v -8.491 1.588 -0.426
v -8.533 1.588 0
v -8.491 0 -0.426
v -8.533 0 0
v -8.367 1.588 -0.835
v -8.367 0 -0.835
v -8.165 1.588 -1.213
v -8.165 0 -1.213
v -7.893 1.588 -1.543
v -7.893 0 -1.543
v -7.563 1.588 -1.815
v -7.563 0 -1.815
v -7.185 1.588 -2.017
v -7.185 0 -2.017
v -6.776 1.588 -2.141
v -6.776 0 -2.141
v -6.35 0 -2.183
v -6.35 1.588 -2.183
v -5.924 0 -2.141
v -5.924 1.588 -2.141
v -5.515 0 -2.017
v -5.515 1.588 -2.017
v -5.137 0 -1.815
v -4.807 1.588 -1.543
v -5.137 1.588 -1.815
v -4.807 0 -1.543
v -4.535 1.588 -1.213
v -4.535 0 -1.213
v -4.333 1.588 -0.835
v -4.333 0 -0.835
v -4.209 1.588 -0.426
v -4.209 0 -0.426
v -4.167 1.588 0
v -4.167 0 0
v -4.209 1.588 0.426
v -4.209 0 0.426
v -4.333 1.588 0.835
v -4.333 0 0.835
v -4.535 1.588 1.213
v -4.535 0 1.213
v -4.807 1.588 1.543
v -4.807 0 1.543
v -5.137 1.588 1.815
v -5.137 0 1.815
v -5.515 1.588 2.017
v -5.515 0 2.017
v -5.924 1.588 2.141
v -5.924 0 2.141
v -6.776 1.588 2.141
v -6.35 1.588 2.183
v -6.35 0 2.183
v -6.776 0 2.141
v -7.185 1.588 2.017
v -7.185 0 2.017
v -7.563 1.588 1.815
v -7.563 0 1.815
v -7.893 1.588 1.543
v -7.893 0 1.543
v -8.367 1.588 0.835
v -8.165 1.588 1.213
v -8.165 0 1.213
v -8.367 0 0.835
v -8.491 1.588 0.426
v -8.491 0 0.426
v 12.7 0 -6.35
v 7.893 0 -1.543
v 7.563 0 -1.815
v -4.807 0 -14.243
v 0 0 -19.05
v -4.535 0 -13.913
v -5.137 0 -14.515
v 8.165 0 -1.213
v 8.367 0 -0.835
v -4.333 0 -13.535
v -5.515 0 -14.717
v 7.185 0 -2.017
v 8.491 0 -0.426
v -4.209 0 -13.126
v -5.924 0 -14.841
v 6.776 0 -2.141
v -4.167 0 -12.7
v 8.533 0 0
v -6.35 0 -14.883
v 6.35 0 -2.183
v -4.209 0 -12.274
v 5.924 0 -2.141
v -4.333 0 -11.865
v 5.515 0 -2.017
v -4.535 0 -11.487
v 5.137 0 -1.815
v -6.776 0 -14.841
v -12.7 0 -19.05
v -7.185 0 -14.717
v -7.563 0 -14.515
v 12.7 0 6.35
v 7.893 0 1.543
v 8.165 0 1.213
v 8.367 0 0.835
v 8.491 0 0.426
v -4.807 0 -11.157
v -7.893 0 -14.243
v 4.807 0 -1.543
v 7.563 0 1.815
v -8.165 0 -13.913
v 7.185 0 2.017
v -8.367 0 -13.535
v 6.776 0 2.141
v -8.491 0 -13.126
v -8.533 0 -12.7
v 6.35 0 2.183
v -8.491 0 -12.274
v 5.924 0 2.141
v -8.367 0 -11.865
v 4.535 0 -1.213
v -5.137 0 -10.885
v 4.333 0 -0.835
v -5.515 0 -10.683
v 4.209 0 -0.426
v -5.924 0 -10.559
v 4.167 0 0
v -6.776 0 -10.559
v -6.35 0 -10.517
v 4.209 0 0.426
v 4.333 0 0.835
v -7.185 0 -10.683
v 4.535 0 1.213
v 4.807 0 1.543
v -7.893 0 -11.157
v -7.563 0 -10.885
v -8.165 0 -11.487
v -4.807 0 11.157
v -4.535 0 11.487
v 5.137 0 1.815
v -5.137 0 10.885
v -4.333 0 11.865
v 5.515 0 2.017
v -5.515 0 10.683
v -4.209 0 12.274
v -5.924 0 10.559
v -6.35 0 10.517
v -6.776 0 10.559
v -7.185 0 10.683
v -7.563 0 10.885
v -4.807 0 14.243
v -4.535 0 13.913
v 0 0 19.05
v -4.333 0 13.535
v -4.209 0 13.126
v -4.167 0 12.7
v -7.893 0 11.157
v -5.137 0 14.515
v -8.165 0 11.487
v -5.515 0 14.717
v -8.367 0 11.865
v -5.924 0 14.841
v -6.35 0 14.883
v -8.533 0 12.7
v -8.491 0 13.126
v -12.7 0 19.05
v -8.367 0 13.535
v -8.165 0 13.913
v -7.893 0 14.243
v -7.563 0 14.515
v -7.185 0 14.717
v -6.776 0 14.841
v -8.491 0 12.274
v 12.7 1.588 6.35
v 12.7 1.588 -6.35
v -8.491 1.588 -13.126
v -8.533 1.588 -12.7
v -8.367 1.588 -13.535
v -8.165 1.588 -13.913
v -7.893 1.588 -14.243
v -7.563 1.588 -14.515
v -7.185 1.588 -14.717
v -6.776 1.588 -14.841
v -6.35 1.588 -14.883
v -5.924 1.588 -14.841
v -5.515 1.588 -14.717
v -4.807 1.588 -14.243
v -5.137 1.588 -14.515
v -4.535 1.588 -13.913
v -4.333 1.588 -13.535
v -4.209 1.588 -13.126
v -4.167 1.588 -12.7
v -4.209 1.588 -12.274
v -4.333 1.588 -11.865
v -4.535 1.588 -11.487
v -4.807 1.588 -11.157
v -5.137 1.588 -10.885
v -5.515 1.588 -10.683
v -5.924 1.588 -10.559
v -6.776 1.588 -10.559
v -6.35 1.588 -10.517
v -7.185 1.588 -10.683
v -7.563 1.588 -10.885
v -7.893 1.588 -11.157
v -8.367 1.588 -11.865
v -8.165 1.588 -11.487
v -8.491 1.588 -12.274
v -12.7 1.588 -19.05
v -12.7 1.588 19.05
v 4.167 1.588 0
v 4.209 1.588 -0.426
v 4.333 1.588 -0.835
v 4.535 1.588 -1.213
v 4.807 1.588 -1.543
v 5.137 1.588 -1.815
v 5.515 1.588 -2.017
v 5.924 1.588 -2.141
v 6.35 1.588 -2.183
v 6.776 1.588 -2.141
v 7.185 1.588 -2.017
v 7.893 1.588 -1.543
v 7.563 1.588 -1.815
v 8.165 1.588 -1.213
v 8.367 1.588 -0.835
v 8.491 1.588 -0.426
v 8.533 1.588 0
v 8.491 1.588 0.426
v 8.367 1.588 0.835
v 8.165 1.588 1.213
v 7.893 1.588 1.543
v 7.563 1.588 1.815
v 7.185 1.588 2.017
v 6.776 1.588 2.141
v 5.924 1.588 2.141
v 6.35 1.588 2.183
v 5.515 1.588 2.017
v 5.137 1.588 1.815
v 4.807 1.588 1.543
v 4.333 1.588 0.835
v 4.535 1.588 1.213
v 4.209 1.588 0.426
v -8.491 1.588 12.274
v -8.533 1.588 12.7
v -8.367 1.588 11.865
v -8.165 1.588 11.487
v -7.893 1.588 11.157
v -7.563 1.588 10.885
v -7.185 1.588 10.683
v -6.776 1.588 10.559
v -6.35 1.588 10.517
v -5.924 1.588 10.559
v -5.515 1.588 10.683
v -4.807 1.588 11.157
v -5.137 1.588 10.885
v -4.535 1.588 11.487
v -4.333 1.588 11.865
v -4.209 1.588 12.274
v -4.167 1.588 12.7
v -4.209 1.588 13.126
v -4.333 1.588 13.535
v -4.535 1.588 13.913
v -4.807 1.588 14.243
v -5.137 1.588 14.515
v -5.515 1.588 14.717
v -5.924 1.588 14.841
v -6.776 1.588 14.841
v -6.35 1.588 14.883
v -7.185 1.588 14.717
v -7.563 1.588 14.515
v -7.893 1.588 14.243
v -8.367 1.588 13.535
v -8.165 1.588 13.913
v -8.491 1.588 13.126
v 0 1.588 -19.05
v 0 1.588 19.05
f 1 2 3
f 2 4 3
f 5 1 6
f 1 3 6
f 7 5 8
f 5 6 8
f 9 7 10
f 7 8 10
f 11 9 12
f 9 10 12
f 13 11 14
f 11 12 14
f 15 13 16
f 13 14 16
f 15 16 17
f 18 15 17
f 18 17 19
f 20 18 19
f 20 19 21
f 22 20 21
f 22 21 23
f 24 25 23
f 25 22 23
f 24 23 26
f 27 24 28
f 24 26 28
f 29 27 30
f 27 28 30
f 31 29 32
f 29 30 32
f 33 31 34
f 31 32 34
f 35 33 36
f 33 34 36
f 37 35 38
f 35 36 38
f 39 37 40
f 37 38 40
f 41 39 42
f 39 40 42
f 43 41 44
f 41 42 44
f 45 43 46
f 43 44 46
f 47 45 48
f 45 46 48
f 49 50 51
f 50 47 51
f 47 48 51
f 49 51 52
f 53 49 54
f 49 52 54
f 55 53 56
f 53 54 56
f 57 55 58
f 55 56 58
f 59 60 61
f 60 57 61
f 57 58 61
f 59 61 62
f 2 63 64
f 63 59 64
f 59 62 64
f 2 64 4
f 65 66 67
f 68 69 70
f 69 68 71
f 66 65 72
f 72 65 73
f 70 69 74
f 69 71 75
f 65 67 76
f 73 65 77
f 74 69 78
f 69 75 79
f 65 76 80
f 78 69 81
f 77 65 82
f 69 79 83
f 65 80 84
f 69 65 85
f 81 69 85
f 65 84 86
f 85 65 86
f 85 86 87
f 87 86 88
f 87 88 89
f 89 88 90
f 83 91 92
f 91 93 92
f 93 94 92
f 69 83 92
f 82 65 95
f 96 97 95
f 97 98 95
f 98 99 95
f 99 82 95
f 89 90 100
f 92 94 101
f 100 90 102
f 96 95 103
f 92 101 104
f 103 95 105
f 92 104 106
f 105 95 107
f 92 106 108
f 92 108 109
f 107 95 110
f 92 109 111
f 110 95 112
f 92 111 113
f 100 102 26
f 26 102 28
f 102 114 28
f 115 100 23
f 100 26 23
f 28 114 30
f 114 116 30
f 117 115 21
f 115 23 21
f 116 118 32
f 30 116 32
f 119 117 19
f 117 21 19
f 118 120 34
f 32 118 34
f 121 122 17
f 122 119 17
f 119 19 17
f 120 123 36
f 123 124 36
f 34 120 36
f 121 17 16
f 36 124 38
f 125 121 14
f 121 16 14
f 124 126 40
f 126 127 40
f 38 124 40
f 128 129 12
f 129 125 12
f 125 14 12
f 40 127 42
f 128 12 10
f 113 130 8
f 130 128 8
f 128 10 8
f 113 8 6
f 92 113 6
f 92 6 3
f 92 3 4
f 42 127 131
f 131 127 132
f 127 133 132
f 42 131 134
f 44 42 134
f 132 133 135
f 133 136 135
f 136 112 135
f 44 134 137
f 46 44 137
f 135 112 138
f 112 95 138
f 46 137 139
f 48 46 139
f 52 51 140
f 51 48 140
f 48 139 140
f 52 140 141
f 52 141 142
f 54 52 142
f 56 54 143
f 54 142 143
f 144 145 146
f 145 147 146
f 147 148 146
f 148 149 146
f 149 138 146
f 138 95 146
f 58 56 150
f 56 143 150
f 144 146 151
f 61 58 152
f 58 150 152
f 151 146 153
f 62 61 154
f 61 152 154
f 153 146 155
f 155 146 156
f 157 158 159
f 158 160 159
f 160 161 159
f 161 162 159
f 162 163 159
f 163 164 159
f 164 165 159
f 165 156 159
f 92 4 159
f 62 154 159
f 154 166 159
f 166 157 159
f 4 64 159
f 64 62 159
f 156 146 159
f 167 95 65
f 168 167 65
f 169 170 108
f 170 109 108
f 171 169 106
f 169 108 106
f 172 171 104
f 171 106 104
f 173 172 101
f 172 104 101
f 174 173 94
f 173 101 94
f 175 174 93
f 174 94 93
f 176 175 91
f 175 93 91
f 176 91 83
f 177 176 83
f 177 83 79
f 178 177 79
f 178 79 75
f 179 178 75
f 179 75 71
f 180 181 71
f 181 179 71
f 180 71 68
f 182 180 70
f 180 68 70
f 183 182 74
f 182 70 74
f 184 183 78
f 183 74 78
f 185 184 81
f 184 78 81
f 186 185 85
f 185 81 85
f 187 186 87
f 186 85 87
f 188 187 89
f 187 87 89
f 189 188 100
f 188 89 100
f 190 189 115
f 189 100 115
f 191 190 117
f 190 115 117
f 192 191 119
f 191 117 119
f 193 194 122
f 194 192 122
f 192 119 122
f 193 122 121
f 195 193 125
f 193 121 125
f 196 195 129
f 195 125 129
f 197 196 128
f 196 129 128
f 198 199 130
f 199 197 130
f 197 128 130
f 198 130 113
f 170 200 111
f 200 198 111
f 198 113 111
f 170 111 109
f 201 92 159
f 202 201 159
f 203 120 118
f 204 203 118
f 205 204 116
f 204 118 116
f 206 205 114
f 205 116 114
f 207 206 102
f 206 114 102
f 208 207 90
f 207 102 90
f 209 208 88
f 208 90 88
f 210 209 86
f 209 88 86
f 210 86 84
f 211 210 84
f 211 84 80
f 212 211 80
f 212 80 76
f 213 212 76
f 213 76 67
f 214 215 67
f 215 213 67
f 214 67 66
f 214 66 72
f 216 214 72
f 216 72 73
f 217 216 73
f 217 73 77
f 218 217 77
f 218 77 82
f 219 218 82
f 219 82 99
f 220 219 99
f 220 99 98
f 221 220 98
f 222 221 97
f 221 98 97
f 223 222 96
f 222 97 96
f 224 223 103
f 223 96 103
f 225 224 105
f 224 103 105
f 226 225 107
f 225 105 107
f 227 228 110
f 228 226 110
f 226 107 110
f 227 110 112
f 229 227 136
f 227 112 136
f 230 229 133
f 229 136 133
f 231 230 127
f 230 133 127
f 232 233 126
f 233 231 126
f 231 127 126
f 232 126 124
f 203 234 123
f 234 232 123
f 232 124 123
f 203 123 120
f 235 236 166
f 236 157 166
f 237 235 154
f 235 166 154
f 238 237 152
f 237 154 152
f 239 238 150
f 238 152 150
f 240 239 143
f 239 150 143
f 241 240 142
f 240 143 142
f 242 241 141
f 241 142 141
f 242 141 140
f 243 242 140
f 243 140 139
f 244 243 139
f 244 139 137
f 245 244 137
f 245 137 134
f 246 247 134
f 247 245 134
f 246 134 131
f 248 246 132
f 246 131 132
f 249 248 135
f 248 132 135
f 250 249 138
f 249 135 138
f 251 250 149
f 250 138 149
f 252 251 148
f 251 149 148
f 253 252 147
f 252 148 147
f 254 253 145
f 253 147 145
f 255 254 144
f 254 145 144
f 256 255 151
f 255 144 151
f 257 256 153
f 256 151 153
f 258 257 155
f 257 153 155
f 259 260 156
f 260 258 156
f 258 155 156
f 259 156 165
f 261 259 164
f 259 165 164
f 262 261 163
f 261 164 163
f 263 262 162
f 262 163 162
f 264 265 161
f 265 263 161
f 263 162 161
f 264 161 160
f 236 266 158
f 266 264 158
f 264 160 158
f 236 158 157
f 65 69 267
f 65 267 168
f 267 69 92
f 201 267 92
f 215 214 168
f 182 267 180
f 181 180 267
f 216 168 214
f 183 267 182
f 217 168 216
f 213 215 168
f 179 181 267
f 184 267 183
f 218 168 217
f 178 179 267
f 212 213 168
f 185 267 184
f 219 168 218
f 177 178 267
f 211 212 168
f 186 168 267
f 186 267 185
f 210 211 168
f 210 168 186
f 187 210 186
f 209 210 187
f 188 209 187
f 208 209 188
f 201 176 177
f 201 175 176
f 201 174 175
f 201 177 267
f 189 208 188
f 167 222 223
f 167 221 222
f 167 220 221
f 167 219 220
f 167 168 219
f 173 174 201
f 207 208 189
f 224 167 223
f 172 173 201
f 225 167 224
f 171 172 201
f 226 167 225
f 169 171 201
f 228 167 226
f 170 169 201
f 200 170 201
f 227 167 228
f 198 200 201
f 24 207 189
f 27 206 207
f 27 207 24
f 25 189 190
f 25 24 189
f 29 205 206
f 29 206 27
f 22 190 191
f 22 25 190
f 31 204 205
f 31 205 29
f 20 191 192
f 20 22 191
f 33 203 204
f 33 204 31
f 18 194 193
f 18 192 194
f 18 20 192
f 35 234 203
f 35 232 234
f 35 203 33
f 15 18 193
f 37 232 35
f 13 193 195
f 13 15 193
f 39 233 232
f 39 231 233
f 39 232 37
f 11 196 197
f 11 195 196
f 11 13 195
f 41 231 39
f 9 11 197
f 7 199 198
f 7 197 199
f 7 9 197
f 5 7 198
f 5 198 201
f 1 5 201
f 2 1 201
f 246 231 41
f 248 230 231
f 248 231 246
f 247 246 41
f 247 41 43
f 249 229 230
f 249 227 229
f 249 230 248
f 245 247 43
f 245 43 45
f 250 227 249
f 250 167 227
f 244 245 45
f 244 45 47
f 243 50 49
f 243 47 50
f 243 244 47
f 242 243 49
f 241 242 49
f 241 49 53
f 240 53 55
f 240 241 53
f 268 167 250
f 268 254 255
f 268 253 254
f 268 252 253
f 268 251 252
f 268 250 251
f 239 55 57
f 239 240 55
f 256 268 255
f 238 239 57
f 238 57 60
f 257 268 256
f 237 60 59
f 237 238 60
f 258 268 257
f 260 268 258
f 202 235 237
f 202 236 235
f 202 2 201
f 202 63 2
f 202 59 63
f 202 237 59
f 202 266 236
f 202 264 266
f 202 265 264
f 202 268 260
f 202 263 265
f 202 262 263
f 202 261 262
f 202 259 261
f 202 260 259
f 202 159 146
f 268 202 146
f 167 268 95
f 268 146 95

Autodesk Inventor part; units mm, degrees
ref_plane "YZ Plane" through (0, 0, 0) normal (1, 0, 0) x (0, 1, 0)
ref_plane "XZ Plane" through (0, 0, 0) normal (0, 1, 0) x (-1, 0, 0)
ref_plane "XY Plane" through (0, 0, 0) normal (0, 0, 1) x (1, 0, 0)
sketch "Sketch1" plane through (0, 0, 0) normal (0, 1, 0) x (-1, 0, 0)
  line L0 (-12.7, -19.05) -> (12.7, -19.05)
  line L1 (12.7, -19.05) -> (12.7, 19.05)
  line L2 (12.7, 19.05) -> (-12.7, 19.05)
  line L3 (-12.7, 19.05) -> (-12.7, -19.05)
  line L4 (-12.7, -19.05) -> (12.7, 19.05) construction
  line L5 (12.7, -19.05) -> (-12.7, 19.05) construction
  line L6 (12.7, 19.05) -> (0, 19.05)
  line L7 (0, 19.05) -> (0, -19.05)
  line L8 (0, -19.05) -> (12.7, -19.05)
  line L9 (12.7, -19.05) -> (12.7, 19.05)
  line L10 (0, 19.05) -> (-12.7, 6.35)
  line L11 (0, 19.05) -> (17.9605, 19.05) construction
  line L12 (0, -19.05) -> (-12.7, -6.35)
  line L13 (0, -19.05) -> (17.9605, -19.05) construction
  circle A0 centre (6.35, 0) radius 2.1828
  circle A1 centre (-6.35, 0) radius 2.1828
  circle A2 centre (6.35, 12.7) radius 2.1828
  circle A3 centre (6.35, -12.7) radius 2.1828
  point P0 (0, 0)
  point P1 (0, 0)
  point P2 (8.9803, -19.05)
  dimension "d0" = 25.4
  dimension "d1" = 38.1
  dimension "d2" = 135
  dimension "d3" = 135
  dimension "d4" = 4.3656
  dimension "d5" = 4.3656
  dimension "d6" = 4.3656
  dimension "d7" = 4.3656
  dimension "d10" = 12.7
  dimension "d11" = 6.35
  dimension "d12" = 19.05
  dimension "d13" = 19.05
extrude "Extrusion1" add sketch "Sketch1" along normal blind 1.5875 contours L7 L2 L1 L0 | L12 L3 L10 L7
properties part number "bracket1"
